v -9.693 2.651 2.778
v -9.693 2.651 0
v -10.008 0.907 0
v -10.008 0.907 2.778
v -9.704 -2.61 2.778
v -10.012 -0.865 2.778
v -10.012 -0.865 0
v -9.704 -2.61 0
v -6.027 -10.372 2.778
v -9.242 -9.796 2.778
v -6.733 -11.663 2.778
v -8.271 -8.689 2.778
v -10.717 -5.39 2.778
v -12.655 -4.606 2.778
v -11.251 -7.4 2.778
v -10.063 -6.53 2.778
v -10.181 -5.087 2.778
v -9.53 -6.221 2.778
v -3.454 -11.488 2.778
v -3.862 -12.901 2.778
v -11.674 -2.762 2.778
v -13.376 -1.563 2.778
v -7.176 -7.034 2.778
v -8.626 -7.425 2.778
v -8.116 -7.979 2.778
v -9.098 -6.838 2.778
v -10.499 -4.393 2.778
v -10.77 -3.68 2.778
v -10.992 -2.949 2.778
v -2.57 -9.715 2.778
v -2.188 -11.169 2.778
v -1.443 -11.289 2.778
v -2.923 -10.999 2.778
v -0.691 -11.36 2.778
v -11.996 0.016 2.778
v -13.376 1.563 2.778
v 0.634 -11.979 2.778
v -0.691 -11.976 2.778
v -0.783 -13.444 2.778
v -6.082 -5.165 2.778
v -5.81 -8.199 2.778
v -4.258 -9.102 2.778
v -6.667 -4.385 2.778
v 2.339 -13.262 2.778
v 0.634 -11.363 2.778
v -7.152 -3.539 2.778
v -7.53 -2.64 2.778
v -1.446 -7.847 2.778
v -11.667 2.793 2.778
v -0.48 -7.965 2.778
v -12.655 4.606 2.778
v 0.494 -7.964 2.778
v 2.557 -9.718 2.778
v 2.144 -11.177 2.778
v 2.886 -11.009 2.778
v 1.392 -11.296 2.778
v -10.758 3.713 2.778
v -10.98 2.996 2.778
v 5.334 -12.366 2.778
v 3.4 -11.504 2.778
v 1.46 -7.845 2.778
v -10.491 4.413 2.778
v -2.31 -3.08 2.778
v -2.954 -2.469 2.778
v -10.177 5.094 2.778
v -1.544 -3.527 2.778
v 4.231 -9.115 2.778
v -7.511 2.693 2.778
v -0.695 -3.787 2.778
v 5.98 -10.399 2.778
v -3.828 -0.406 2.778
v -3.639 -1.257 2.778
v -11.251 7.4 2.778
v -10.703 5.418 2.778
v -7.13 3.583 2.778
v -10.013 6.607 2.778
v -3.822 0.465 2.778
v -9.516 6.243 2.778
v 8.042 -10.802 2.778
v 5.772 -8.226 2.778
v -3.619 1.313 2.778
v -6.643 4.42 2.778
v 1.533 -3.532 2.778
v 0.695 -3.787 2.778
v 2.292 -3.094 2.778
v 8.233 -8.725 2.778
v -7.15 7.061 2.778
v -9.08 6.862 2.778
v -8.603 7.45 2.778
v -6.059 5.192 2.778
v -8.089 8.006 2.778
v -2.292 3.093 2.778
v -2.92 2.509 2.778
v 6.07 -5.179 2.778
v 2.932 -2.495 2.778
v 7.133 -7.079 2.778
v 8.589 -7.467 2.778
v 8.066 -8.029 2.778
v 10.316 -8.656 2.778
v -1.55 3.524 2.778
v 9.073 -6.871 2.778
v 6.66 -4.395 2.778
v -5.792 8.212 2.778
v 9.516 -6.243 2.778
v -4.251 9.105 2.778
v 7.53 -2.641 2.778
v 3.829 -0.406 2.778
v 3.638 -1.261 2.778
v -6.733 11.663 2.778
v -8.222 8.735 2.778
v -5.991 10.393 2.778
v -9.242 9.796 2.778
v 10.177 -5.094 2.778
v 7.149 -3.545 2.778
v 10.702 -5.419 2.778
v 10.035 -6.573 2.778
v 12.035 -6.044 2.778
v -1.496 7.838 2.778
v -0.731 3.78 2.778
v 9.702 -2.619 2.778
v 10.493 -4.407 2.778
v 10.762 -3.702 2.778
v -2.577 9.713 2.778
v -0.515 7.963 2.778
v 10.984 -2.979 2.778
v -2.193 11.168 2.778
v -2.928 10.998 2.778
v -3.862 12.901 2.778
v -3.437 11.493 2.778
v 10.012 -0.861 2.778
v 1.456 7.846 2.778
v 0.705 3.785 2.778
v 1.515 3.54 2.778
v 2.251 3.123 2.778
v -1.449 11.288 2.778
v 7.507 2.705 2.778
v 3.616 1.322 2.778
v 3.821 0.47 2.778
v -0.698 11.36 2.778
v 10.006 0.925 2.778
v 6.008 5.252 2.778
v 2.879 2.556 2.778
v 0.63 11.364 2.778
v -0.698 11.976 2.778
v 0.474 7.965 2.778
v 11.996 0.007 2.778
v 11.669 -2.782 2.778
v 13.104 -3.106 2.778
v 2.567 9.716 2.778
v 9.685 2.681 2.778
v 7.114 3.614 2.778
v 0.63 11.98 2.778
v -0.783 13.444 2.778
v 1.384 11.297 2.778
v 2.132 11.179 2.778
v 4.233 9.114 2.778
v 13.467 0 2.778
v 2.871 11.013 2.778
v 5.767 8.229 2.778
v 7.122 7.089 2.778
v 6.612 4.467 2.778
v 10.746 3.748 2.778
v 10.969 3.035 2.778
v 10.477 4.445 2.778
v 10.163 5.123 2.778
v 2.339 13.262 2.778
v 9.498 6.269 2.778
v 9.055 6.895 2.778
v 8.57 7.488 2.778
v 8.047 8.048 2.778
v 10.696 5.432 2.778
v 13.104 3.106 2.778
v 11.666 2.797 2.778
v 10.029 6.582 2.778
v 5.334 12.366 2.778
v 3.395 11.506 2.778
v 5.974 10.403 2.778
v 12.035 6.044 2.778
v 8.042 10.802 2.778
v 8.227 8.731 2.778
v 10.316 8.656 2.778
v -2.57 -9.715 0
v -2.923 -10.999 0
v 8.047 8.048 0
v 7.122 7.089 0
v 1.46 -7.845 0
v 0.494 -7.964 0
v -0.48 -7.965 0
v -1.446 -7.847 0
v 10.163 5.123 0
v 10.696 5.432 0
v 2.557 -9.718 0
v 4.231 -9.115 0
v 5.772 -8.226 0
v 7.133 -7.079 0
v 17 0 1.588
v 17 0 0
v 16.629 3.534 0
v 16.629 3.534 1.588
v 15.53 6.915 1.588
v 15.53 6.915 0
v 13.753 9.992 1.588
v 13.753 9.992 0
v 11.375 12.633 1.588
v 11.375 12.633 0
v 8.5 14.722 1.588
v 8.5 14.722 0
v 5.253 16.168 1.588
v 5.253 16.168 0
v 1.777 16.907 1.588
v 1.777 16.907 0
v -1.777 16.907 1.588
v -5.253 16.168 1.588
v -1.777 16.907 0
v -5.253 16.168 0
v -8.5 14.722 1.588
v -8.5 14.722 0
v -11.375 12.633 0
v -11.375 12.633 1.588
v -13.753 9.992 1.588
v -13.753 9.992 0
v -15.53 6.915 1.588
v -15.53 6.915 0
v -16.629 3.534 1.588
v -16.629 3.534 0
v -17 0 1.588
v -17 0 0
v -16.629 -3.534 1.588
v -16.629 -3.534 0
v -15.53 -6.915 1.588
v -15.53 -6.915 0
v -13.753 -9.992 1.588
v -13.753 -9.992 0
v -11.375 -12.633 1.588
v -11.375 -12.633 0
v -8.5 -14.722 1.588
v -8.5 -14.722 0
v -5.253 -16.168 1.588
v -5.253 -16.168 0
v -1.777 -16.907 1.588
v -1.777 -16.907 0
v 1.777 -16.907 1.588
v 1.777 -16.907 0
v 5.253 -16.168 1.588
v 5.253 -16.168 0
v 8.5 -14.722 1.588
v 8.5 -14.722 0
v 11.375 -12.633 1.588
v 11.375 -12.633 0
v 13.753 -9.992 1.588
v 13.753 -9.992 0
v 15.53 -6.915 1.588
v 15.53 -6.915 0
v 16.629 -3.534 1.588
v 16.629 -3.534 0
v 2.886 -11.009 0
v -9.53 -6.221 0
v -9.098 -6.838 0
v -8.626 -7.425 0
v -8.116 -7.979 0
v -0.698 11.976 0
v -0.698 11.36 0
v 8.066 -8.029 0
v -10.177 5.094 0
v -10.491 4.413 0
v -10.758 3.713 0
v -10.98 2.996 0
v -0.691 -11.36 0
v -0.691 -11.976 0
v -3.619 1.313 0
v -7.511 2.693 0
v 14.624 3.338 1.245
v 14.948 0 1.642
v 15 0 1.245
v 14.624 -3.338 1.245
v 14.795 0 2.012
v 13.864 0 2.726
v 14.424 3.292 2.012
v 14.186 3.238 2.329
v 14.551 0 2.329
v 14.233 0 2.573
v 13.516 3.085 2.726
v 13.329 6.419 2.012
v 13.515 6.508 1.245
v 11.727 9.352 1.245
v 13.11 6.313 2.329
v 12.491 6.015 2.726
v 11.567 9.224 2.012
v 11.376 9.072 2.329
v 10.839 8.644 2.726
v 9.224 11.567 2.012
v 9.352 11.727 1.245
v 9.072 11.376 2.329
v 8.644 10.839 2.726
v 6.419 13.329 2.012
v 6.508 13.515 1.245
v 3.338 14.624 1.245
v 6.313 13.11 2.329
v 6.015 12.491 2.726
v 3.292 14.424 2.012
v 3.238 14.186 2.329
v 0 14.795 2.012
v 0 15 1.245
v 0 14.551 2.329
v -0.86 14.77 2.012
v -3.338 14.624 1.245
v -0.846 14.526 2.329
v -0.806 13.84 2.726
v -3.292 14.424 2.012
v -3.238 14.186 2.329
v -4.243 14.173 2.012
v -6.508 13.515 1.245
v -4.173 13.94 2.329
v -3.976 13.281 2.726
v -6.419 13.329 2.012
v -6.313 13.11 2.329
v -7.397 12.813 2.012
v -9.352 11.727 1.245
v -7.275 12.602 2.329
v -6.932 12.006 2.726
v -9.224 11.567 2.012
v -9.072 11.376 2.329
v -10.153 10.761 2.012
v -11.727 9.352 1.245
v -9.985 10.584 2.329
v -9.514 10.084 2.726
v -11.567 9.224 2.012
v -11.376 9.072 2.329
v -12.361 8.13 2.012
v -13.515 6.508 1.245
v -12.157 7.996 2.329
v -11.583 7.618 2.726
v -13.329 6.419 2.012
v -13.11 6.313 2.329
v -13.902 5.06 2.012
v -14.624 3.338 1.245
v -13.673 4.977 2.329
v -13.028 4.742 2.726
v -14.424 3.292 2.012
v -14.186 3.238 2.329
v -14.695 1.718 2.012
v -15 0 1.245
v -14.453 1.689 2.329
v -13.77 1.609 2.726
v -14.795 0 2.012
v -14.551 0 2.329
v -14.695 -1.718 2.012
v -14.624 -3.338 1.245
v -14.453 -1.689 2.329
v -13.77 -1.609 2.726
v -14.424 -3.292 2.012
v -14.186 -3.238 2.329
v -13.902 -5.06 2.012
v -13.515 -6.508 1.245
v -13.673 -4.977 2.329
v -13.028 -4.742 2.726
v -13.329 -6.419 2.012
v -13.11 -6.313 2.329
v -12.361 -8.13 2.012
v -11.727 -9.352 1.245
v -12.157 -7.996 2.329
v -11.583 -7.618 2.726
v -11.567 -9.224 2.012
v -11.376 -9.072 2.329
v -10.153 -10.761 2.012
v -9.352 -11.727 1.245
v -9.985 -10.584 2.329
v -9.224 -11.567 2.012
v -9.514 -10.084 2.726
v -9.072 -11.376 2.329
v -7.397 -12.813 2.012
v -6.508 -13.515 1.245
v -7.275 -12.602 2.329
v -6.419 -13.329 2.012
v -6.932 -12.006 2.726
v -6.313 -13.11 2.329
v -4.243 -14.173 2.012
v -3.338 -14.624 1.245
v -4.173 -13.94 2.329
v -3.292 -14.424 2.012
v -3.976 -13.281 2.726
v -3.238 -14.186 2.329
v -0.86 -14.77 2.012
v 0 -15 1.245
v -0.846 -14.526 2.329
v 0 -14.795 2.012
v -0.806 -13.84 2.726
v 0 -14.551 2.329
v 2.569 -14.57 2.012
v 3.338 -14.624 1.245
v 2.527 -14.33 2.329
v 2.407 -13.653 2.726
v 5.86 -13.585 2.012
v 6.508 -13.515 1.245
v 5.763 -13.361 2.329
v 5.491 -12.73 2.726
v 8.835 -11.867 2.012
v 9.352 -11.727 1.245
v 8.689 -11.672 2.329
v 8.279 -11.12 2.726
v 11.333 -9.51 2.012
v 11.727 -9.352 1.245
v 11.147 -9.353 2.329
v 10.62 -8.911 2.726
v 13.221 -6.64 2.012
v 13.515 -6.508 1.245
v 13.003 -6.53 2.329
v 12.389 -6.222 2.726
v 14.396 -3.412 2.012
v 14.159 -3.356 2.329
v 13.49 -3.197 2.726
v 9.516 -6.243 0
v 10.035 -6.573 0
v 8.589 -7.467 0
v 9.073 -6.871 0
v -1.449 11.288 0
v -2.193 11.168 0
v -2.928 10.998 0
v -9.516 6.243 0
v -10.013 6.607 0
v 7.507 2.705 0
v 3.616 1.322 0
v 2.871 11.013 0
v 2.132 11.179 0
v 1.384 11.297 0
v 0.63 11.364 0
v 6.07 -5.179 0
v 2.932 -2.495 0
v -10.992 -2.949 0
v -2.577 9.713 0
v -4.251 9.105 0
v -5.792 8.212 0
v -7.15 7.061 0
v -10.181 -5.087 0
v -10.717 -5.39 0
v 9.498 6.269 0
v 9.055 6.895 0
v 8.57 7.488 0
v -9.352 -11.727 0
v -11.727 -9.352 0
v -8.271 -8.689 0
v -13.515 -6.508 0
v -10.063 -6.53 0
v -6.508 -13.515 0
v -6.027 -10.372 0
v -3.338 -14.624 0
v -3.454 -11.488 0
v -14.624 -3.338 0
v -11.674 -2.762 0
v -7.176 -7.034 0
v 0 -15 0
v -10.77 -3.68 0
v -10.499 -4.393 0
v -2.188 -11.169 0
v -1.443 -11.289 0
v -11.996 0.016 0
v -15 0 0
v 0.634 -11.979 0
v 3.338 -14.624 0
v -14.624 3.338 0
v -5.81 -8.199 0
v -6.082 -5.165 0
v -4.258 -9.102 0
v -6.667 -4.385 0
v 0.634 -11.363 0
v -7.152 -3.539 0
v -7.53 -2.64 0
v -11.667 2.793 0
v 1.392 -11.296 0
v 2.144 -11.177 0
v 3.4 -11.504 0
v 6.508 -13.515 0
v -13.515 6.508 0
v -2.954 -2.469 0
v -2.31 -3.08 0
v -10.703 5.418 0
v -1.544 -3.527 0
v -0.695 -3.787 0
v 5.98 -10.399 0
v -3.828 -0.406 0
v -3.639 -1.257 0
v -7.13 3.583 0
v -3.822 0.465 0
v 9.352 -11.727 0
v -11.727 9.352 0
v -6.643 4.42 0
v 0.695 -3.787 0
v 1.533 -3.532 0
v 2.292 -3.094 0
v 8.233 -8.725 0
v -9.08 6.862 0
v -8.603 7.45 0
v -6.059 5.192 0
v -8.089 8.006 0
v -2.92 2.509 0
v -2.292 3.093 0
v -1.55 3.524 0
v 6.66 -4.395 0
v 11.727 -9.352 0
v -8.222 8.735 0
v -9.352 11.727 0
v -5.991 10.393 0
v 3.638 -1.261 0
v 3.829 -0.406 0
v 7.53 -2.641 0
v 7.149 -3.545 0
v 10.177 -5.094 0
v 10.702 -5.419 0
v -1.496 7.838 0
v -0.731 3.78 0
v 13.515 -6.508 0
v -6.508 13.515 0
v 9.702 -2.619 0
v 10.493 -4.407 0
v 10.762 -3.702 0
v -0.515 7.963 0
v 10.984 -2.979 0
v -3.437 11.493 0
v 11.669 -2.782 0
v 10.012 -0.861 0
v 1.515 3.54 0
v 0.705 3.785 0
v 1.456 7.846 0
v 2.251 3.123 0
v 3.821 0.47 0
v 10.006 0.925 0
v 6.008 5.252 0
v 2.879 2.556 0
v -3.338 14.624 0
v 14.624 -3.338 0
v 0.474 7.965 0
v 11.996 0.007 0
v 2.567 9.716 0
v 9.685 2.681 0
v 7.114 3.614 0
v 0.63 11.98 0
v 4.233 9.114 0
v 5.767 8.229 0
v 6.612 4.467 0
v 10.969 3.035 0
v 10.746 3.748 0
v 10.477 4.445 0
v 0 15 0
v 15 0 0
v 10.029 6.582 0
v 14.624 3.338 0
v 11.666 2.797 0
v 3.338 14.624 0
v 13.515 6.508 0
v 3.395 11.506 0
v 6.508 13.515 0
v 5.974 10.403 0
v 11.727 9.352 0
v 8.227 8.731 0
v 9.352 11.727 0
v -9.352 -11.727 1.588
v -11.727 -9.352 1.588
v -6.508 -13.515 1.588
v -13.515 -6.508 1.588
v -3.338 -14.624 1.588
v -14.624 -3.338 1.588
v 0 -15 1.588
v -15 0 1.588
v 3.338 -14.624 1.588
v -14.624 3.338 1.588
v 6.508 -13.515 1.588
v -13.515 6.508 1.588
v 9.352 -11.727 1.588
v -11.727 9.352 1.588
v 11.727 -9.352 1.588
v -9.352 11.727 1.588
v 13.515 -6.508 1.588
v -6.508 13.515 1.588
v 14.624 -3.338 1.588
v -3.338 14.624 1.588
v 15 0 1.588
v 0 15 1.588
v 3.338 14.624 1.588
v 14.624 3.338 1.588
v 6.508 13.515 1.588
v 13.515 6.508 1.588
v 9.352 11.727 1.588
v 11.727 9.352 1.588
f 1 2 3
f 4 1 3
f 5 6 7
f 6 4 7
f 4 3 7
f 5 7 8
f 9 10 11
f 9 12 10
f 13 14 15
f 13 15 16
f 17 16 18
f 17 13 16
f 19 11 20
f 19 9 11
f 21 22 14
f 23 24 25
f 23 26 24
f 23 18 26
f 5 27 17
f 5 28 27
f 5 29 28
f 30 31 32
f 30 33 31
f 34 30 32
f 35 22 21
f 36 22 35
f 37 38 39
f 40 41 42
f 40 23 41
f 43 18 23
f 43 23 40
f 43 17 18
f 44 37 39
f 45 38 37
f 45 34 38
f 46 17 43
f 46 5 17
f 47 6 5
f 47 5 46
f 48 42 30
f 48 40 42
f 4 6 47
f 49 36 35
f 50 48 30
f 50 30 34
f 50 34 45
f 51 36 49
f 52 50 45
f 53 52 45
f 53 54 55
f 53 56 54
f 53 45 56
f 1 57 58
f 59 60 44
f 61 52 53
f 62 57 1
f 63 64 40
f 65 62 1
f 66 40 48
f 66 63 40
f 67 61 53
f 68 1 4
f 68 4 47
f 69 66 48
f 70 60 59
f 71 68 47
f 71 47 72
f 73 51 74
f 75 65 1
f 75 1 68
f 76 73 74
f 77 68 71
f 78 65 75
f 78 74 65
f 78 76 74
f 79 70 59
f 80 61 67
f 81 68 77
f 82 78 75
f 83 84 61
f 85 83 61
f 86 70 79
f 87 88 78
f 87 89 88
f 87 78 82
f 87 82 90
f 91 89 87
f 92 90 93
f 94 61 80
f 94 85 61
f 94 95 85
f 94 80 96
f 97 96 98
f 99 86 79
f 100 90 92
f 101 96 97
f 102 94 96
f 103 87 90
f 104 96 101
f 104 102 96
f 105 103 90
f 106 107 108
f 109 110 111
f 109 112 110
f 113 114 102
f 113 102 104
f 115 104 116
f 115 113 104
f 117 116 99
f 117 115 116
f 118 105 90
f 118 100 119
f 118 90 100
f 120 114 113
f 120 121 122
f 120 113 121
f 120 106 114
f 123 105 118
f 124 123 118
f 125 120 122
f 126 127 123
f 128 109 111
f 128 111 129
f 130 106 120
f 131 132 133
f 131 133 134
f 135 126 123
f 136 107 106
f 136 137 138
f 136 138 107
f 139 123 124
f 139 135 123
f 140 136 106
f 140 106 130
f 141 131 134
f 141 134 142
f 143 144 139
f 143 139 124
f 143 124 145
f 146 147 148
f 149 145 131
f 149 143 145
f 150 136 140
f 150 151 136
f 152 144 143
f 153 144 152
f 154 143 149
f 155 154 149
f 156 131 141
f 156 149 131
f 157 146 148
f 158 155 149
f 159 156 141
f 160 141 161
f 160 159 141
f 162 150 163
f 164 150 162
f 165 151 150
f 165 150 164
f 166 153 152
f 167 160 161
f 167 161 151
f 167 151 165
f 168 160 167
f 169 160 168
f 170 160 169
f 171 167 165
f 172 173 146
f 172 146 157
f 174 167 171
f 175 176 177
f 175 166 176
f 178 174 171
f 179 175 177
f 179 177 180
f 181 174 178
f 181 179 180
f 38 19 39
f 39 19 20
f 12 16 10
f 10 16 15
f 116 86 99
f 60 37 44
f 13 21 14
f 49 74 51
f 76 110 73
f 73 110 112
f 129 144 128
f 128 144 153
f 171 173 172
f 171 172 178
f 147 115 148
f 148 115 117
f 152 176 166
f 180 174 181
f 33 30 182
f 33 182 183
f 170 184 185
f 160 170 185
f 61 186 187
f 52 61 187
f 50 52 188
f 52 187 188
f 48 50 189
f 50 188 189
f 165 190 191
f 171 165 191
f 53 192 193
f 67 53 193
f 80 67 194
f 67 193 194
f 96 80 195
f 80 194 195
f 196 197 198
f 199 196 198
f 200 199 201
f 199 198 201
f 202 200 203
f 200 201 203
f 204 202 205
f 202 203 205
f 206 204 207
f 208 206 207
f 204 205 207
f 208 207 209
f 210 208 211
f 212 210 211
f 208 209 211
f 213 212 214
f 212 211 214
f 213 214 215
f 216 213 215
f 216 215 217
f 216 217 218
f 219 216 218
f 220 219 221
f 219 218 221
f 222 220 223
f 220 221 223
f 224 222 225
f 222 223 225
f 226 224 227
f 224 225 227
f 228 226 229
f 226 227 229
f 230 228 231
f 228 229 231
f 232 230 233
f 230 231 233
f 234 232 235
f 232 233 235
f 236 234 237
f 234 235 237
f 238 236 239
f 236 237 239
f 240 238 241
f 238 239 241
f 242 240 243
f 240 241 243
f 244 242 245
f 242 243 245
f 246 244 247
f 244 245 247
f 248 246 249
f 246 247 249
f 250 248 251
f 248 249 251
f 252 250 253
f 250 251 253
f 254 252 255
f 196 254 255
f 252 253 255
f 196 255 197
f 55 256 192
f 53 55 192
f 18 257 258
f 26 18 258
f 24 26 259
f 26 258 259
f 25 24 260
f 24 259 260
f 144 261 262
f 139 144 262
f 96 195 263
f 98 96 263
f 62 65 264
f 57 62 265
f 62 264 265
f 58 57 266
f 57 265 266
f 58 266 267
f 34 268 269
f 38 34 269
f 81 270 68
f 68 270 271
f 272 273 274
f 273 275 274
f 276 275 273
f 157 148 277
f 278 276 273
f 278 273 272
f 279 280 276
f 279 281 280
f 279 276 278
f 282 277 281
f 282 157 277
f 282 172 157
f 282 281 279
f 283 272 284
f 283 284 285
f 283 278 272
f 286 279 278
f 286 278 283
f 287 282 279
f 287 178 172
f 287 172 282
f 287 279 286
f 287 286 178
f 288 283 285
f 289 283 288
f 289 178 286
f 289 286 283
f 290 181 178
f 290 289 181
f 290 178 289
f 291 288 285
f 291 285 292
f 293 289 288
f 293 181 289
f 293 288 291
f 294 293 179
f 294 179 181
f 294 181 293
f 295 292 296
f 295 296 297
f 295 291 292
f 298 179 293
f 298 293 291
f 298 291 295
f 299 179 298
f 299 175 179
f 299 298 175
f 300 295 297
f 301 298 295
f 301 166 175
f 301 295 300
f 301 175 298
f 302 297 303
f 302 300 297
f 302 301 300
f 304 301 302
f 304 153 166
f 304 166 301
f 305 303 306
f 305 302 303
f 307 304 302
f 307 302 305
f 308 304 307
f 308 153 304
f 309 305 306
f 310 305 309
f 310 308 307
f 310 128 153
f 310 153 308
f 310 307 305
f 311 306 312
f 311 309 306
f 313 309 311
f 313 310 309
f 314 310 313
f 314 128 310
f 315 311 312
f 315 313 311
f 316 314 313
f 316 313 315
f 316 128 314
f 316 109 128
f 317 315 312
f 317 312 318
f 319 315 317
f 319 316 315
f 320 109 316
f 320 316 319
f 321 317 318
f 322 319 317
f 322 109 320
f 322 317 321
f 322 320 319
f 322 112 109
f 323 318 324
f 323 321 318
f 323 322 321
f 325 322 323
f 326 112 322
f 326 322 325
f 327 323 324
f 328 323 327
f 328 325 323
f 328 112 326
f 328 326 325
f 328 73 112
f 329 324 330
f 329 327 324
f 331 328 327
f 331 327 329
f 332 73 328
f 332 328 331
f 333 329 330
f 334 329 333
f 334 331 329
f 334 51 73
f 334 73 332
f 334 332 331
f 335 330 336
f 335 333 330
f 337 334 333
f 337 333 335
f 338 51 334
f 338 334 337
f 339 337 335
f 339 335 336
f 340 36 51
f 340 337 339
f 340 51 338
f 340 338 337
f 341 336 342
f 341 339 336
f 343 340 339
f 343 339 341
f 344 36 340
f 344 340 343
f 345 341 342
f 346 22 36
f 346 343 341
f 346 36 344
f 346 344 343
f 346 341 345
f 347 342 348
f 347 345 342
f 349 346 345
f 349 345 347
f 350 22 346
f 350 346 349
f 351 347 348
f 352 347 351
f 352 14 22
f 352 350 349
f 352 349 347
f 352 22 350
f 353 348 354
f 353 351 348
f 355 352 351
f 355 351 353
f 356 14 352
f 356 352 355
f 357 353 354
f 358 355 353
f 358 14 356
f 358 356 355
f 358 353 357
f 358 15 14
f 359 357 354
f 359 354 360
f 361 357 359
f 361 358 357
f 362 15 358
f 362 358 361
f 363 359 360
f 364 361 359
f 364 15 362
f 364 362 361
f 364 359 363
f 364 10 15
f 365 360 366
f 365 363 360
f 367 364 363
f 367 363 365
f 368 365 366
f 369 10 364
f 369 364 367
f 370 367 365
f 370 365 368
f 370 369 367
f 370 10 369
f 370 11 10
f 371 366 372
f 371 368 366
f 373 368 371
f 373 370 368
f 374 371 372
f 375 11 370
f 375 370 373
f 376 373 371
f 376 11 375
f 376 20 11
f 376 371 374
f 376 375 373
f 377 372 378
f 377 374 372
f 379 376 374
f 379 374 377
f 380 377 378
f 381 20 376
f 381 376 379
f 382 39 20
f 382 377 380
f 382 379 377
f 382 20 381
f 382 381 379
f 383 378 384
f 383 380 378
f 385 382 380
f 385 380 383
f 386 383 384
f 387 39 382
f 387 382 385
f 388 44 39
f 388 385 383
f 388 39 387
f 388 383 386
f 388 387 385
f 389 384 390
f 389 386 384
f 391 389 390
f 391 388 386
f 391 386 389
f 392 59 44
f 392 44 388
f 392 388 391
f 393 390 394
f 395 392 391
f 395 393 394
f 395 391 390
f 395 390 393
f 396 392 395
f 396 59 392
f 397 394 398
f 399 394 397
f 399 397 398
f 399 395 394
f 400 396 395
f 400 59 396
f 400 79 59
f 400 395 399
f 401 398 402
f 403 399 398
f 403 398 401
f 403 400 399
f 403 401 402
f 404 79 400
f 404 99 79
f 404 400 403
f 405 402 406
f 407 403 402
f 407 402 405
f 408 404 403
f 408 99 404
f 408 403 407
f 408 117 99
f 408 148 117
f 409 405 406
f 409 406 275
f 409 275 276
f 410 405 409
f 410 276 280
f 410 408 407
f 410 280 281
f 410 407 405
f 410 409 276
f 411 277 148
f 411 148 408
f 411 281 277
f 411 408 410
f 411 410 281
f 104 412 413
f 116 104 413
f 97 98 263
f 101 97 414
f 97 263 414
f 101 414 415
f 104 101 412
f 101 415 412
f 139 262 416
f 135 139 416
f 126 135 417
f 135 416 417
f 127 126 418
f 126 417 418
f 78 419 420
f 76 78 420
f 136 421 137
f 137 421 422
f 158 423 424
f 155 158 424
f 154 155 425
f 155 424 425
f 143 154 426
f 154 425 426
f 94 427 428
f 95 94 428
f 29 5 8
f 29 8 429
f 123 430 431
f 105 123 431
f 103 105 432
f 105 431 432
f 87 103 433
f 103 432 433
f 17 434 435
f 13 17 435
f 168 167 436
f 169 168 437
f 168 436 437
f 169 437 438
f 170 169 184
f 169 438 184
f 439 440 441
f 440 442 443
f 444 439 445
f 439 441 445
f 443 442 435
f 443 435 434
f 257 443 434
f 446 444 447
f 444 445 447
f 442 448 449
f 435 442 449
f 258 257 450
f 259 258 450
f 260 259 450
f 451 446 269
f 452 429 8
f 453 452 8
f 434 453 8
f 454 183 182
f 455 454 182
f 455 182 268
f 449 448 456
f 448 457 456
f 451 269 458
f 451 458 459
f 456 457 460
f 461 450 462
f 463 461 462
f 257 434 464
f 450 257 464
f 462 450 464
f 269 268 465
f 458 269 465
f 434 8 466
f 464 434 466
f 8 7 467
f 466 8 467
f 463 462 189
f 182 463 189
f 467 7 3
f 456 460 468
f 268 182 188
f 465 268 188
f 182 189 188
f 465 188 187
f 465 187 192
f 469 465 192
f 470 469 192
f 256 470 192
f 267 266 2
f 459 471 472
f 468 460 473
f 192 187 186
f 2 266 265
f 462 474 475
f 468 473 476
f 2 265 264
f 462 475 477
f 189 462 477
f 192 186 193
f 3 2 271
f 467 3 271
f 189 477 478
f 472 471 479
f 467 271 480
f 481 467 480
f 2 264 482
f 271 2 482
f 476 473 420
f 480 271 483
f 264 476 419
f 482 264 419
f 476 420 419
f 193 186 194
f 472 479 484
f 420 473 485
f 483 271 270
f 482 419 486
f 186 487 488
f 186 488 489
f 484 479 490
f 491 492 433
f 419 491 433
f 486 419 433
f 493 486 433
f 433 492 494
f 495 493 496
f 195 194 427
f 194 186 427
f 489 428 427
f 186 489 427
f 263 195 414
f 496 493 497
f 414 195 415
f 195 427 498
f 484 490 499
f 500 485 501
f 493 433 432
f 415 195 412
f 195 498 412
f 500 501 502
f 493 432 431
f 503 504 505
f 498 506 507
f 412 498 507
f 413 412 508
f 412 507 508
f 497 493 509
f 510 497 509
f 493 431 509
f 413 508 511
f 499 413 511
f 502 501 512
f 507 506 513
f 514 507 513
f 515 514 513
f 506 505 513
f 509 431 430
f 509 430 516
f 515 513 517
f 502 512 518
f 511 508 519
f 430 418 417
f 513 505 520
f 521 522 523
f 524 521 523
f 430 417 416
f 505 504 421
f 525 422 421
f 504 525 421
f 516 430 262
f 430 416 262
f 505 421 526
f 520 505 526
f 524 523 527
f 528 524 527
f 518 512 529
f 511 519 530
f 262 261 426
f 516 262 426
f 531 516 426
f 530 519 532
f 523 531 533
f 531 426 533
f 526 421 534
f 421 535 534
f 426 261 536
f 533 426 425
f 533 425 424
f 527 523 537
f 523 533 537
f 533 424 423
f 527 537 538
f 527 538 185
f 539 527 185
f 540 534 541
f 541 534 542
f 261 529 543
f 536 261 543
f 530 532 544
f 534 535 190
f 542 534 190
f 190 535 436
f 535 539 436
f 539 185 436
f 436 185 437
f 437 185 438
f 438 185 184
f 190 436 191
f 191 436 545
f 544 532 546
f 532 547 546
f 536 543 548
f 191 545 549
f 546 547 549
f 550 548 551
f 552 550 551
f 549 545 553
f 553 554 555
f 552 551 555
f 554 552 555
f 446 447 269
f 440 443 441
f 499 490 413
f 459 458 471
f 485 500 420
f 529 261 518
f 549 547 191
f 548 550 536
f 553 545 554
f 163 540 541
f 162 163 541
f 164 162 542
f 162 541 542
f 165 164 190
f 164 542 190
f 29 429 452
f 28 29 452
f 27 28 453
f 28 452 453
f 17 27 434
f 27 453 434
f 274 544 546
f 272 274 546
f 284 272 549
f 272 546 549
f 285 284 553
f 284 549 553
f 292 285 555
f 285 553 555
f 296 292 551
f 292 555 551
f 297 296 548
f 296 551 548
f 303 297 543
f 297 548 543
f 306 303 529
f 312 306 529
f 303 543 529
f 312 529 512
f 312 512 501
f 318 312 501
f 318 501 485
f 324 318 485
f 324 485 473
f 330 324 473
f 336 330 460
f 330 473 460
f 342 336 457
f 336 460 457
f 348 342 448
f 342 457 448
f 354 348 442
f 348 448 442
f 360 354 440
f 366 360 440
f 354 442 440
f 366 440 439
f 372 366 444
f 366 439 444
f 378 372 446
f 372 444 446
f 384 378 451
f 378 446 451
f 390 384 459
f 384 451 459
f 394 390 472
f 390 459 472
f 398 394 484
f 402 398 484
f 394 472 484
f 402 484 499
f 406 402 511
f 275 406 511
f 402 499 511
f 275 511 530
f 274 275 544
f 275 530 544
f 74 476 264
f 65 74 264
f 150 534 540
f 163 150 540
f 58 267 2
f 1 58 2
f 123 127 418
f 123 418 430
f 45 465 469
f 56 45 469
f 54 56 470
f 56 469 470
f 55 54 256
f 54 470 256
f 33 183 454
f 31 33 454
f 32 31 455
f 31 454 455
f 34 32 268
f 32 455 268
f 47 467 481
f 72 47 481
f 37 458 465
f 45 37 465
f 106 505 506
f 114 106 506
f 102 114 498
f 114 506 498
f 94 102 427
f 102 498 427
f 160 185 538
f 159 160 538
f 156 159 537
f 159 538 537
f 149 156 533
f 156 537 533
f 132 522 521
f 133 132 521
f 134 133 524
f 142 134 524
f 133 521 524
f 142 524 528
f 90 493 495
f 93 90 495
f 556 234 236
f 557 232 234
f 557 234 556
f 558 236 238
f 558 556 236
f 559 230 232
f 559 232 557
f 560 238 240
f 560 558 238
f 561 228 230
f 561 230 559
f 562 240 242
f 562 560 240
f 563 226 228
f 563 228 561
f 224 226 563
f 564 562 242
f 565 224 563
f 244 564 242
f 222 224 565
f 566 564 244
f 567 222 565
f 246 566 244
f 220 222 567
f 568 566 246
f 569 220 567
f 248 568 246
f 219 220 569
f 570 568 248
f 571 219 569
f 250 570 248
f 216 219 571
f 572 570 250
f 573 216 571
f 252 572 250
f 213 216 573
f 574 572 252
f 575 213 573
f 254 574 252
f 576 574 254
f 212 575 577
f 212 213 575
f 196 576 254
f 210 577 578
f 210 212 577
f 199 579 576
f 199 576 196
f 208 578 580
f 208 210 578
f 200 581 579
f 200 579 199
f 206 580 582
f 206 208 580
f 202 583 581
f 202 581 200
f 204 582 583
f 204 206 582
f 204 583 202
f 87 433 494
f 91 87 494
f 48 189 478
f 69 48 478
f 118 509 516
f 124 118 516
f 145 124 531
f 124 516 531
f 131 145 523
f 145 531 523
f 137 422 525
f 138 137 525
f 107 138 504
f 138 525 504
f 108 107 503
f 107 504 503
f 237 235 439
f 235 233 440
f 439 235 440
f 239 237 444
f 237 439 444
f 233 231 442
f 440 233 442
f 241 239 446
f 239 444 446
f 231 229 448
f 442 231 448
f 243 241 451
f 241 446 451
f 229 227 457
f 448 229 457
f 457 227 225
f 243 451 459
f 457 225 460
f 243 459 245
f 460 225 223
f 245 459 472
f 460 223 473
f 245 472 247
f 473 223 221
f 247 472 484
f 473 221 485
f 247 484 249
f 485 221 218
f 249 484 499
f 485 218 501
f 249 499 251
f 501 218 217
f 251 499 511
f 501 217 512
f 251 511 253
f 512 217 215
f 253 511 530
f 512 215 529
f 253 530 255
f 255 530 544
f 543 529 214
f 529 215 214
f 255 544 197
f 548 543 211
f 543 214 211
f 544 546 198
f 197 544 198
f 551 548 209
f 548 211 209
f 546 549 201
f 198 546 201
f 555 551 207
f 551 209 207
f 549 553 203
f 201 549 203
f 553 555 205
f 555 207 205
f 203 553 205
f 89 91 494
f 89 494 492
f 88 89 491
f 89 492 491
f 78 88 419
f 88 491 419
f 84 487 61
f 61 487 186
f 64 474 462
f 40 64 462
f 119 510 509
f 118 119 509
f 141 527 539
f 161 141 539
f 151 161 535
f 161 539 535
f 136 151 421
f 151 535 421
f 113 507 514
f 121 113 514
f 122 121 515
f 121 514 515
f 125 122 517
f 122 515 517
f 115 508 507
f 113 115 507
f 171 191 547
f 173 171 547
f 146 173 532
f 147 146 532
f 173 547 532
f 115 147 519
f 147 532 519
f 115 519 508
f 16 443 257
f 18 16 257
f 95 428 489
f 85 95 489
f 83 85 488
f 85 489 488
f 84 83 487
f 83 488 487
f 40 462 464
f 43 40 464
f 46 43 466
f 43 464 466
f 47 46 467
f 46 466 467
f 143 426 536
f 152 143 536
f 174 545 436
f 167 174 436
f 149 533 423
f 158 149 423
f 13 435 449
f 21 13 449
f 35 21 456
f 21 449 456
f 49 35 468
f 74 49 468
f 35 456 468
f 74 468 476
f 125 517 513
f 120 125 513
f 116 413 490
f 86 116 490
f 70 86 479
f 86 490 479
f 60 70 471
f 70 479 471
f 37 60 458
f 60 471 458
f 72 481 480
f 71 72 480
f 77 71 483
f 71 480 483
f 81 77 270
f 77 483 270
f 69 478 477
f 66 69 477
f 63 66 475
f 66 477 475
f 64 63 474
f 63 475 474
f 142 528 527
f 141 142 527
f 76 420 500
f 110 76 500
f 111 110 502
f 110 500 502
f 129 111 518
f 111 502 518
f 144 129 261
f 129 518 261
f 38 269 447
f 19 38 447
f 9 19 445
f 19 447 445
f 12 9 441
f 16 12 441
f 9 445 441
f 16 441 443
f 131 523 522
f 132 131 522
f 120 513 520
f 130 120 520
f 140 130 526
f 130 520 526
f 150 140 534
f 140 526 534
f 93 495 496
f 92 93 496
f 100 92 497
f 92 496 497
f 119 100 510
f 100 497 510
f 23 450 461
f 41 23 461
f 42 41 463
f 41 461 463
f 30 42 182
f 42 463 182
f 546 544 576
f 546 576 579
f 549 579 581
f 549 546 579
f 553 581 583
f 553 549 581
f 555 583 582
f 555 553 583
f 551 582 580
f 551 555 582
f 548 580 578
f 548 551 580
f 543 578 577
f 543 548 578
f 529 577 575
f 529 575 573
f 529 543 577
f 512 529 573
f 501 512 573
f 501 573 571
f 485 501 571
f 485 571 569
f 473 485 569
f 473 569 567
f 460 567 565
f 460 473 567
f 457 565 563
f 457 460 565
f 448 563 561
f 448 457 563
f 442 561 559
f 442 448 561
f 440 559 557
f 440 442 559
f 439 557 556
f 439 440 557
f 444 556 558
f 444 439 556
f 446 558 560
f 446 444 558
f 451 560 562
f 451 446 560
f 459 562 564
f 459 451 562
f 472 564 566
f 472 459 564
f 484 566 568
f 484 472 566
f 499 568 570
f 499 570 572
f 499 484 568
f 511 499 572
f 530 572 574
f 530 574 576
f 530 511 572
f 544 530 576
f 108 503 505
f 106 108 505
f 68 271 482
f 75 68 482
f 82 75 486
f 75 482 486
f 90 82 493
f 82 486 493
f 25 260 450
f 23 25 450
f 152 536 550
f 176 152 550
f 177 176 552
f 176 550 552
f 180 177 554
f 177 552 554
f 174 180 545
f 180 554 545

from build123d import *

# Parameters (mm, degrees)
F2_R      = 13.335
F3_DEPTH  = 2.778125
F4_R      = 38.2444741699
F5_DEPTH  = 8
F6_SCALE  = 0.35
F8_R      = 17
F8_R_2    = 15
F9_DEPTH  = 1.5875
F10_DEPTH = 2.778125
F12_R     = 1.5330256121


with BuildPart() as f3:
    # F2 (on Top) → F3 (new body)
    with BuildSketch(Plane.XY):
        Circle(F2_R)
    extrude(amount=F3_DEPTH)


with BuildPart() as f5:
    # F4 (on Top) → F5 (new body)
    with BuildSketch(Plane.XY):
        Circle(F4_R)
        with BuildLine():
            Line((-23.1882267199, -22.7963136928), (-20.5038965179, -20.0980395265))
            ThreePointArc((-20.5038965179, -20.0980395265), (-14.4400553992, -24.8158369855), (-7.3422192738, -27.7566709343))
            Line((-7.3422192738, -27.7566709343), (-8.3522358133, -31.4261982001))
            ThreePointArc((-8.3522358133, -31.4261982001), (-5.1890091297, -32.1004666733), (-1.9744469831, -32.4571615442))
            Line((-1.9744469831, -32.4571615442), (-1.9744469831, -34.2176145586))
            ThreePointArc((-1.9744469831, -34.2176145586), (-17.2202807743, -29.634532509), (-28.7509978869, -18.6580735201))
            Line((-28.7509978869, -18.6580735201), (-27.2287172495, -17.775340597))
            ThreePointArc((-27.2287172495, -17.775340597), (-25.3331719789, -20.3861760485), (-23.1882267199, -22.7963136928))
        make_face(mode=Mode.SUBTRACT)
        with BuildLine():
            ThreePointArc((-10.3971981615, -3.5914162096), (-10.9996759089, 0.0844387241), (-10.3408372804, 3.7506111957))
            Line((-10.3408372804, 3.7506111957), (-21.461091167, 7.6938226179))
            ThreePointArc((-21.461091167, 7.6938226179), (-19.7124031361, 11.4540169003), (-17.3115200116, 14.8352490859))
            Line((-17.3115200116, 14.8352490859), (-8.3441187098, 7.1676832349))
            ThreePointArc((-8.3441187098, 7.1676832349), (-5.5232984187, 9.5127900522), (-2.0882255783, 10.7999682376))
            Line((-2.0882255783, 10.7999682376), (-4.2733694852, 22.3944558719))
            ThreePointArc((-4.2733694852, 22.3944558719), (-0.058138144, 22.7984639945), (4.1590988757, 22.4159594284))
            Line((4.1590988757, 22.4159594284), (2.013932512, 10.8140684221))
            ThreePointArc((2.013932512, 10.8140684221), (5.4124271261, 9.5763057911), (8.2257613426, 7.303208222))
            Line((8.2257613426, 7.303208222), (17.1646100288, 15.0049826095))
            ThreePointArc((17.1646100288, 15.0049826095), (19.6462671578, 11.5670881089), (21.4484059868, 7.7291151615))
            Line((21.4484059868, 7.7291151615), (10.3311758086, 3.7771426254))
            ThreePointArc((10.3311758086, 3.7771426254), (10.9996061892, 0.0930789068), (10.3936163191, -3.6017689837))
            Line((10.3936163191, -3.6017689837), (21.5138702057, -7.5449804059))
            ThreePointArc((21.5138702057, -7.5449804059), (19.76448965, -11.3639029135), (17.3441732478, -14.7970603467))
            Line((17.3441732478, -14.7970603467), (8.3767719461, -7.1294944957))
            ThreePointArc((8.3767719461, -7.1294944957), (5.5001196113, -9.526210383), (1.986209068, -10.8191946807))
            Line((1.986209068, -10.8191946807), (4.1713529749, -22.4136823149))
            ThreePointArc((4.1713529749, -22.4136823149), (0.020424338, -22.7985289745), (-4.1311871745, -22.4211202459))
            Line((-4.1311871745, -22.4211202459), (-1.9860208108, -10.8192292396))
            ThreePointArc((-1.9860208108, -10.8192292396), (-5.5419240379, -9.5019512711), (-8.4392236838, -7.0554591356))
            Line((-8.4392236838, -7.0554591356), (-17.37807237, -14.7572335231))
            ThreePointArc((-17.37807237, -14.7572335231), (-19.77793068, -11.3404937534), (-21.5144283397, -7.5433887457))
            Line((-21.5144283397, -7.5433887457), (-10.3971981615, -3.5914162096))
        make_face(mode=Mode.SUBTRACT)
        with BuildLine():
            Line((8.2448381461, -31.4545453049), (7.3048568966, -27.7665271675))
            ThreePointArc((7.3048568966, -27.7665271675), (14.3464034329, -24.8700959741), (20.3790232601, -20.2246477395))
            Line((20.3790232601, -20.2246477395), (23.0455846526, -22.9405057576))
            ThreePointArc((23.0455846526, -22.9405057576), (25.245886713, -20.4941694261), (27.1877075422, -17.8380025506))
            Line((27.1877075422, -17.8380025506), (28.6707925268, -18.7810873715))
            ThreePointArc((28.6707925268, -18.7810873715), (17.0863228663, -29.7119699428), (1.8120871851, -34.226596778))
            Line((1.8120871851, -34.226596778), (1.8120871851, -32.4666308142))
            ThreePointArc((1.8120871851, -32.4666308142), (5.0538614988, -32.1220214237), (8.2448381461, -31.4545453049))
        make_face(mode=Mode.SUBTRACT)
        with BuildLine():
            Line((-31.3700210711, 8.5608150542), (-27.6944457003, 7.5735488759))
            ThreePointArc((-27.6944457003, 7.5735488759), (-28.7112762752, 0.0598320032), (-27.7257703658, -7.4580575786))
            Line((-27.7257703658, -7.4580575786), (-31.4063372087, -8.4266102037))
            ThreePointArc((-31.4063372087, -8.4266102037), (-30.4009916701, -11.5388683098), (-29.0880936569, -14.5343931349))
            Line((-29.0880936569, -14.5343931349), (-30.6199831431, -15.4000071198))
            ThreePointArc((-30.6199831431, -15.4000071198), (-34.274503919, 0.0443630643), (-30.5800147401, 15.4792210873))
            Line((-30.5800147401, 15.4792210873), (-29.0784483945, 14.5536804747))
            ThreePointArc((-29.0784483945, 14.5536804747), (-30.3724048138, 11.6139055542), (-31.3700210711, 8.5608150542))
        make_face(mode=Mode.SUBTRACT)
        with BuildLine():
            ThreePointArc((-1.9952594939, 32.4558887715), (-5.2058787413, 32.0977351681), (-8.3651152282, 31.4227723731))
            Line((-8.3651152282, 31.4227723731), (-7.3636623113, 27.7509899389))
            ThreePointArc((-7.3636623113, 27.7509899389), (-14.4032915605, 24.8371930267), (-20.4287021431, 20.1744663863))
            Line((-20.4287021431, 20.1744663863), (-23.1117025135, 22.8738930513))
            ThreePointArc((-23.1117025135, 22.8738930513), (-25.2757879931, 20.457280311), (-27.1883197733, 17.8370693864))
            Line((-27.1883197733, 17.8370693864), (-28.6074298216, 18.8774613223))
            ThreePointArc((-28.6074298216, 18.8774613223), (-17.1158395657, 29.6949763922), (-1.9952594939, 34.2164072708))
            Line((-1.9952594939, 34.2164072708), (-1.9952594939, 32.4558887715))
        make_face(mode=Mode.SUBTRACT)
        with BuildLine():
            ThreePointArc((27.7193841618, -7.4817582766), (28.7111916158, 0.0918761434), (27.6709335359, 7.6590079303))
            Line((27.6709335359, 7.6590079303), (31.3395244772, 8.671792314))
            ThreePointArc((31.3395244772, 8.671792314), (30.3348860947, 11.7115525023), (29.0362003632, 14.6377882502))
            Line((29.0362003632, 14.6377882502), (30.558746192, 15.5211667778))
            ThreePointArc((30.558746192, 15.5211667778), (34.2745262259, 0.0209514), (30.5776989663, -15.4837951711))
            Line((30.5776989663, -15.4837951711), (29.0783158896, -14.5539452184))
            ThreePointArc((29.0783158896, -14.5539452184), (30.3813182742, -11.5905684208), (31.3832152909, -8.5123189788))
            Line((31.3832152909, -8.5123189788), (27.7193841618, -7.4817582766))
        make_face(mode=Mode.SUBTRACT)
        with BuildLine():
            Line((7.3346508819, 27.7586718282), (8.2016570522, 31.465832231))
            ThreePointArc((8.2016570522, 31.465832231), (5.0263686738, 32.1263349038), (1.8010777644, 32.4672434198))
            Line((1.8010777644, 32.4672434198), (1.8010777644, 34.2271778834))
            ThreePointArc((1.8010777644, 34.2271778834), (17.0694808141, 29.7216488727), (28.6555357791, 18.8043573724))
            Line((28.6555357791, 18.8043573724), (27.138533169, 17.9127271467))
            ThreePointArc((27.138533169, 17.9127271467), (25.1932014823, 20.5589001521), (22.9908654017, 22.9953448435))
            Line((22.9908654017, 22.9953448435), (20.3499365278, 20.2539144004))
            ThreePointArc((20.3499365278, 20.2539144004), (14.3418771792, 24.8727064108), (7.3346508819, 27.7586718282))
        make_face(mode=Mode.SUBTRACT)
    extrude(amount=F5_DEPTH)


with BuildPart() as f5_1:
    # F6: moved
    add(f5.part.scale(F6_SCALE))


with BuildPart() as f3_1:
    add(f3.part)

    # F7: cut F5
    add(f5_1.part, mode=Mode.SUBTRACT)


with BuildPart() as f9:
    # F8 (on Top) → F9 (new body)
    with BuildSketch(Plane.XY):
        Circle(F8_R)
        Circle(F8_R_2, mode=Mode.SUBTRACT)
    extrude(amount=F9_DEPTH)


with BuildPart() as f10:
    # F8 (on Top) → F10 (new body)
    with BuildSketch(Plane.XY):
        Circle(F8_R_2)
    extrude(amount=F10_DEPTH)

    # F11: cut F3
    add(f3_1.part, mode=Mode.SUBTRACT)

    # F12
    f12_edges = [f10.edges().sort_by_distance(p)[0] for p in [
        (-15, 0, 2.778125),
    ]]
    fillet(f12_edges, radius=F12_R)


solid = Compound([f9.part, f10.part])
